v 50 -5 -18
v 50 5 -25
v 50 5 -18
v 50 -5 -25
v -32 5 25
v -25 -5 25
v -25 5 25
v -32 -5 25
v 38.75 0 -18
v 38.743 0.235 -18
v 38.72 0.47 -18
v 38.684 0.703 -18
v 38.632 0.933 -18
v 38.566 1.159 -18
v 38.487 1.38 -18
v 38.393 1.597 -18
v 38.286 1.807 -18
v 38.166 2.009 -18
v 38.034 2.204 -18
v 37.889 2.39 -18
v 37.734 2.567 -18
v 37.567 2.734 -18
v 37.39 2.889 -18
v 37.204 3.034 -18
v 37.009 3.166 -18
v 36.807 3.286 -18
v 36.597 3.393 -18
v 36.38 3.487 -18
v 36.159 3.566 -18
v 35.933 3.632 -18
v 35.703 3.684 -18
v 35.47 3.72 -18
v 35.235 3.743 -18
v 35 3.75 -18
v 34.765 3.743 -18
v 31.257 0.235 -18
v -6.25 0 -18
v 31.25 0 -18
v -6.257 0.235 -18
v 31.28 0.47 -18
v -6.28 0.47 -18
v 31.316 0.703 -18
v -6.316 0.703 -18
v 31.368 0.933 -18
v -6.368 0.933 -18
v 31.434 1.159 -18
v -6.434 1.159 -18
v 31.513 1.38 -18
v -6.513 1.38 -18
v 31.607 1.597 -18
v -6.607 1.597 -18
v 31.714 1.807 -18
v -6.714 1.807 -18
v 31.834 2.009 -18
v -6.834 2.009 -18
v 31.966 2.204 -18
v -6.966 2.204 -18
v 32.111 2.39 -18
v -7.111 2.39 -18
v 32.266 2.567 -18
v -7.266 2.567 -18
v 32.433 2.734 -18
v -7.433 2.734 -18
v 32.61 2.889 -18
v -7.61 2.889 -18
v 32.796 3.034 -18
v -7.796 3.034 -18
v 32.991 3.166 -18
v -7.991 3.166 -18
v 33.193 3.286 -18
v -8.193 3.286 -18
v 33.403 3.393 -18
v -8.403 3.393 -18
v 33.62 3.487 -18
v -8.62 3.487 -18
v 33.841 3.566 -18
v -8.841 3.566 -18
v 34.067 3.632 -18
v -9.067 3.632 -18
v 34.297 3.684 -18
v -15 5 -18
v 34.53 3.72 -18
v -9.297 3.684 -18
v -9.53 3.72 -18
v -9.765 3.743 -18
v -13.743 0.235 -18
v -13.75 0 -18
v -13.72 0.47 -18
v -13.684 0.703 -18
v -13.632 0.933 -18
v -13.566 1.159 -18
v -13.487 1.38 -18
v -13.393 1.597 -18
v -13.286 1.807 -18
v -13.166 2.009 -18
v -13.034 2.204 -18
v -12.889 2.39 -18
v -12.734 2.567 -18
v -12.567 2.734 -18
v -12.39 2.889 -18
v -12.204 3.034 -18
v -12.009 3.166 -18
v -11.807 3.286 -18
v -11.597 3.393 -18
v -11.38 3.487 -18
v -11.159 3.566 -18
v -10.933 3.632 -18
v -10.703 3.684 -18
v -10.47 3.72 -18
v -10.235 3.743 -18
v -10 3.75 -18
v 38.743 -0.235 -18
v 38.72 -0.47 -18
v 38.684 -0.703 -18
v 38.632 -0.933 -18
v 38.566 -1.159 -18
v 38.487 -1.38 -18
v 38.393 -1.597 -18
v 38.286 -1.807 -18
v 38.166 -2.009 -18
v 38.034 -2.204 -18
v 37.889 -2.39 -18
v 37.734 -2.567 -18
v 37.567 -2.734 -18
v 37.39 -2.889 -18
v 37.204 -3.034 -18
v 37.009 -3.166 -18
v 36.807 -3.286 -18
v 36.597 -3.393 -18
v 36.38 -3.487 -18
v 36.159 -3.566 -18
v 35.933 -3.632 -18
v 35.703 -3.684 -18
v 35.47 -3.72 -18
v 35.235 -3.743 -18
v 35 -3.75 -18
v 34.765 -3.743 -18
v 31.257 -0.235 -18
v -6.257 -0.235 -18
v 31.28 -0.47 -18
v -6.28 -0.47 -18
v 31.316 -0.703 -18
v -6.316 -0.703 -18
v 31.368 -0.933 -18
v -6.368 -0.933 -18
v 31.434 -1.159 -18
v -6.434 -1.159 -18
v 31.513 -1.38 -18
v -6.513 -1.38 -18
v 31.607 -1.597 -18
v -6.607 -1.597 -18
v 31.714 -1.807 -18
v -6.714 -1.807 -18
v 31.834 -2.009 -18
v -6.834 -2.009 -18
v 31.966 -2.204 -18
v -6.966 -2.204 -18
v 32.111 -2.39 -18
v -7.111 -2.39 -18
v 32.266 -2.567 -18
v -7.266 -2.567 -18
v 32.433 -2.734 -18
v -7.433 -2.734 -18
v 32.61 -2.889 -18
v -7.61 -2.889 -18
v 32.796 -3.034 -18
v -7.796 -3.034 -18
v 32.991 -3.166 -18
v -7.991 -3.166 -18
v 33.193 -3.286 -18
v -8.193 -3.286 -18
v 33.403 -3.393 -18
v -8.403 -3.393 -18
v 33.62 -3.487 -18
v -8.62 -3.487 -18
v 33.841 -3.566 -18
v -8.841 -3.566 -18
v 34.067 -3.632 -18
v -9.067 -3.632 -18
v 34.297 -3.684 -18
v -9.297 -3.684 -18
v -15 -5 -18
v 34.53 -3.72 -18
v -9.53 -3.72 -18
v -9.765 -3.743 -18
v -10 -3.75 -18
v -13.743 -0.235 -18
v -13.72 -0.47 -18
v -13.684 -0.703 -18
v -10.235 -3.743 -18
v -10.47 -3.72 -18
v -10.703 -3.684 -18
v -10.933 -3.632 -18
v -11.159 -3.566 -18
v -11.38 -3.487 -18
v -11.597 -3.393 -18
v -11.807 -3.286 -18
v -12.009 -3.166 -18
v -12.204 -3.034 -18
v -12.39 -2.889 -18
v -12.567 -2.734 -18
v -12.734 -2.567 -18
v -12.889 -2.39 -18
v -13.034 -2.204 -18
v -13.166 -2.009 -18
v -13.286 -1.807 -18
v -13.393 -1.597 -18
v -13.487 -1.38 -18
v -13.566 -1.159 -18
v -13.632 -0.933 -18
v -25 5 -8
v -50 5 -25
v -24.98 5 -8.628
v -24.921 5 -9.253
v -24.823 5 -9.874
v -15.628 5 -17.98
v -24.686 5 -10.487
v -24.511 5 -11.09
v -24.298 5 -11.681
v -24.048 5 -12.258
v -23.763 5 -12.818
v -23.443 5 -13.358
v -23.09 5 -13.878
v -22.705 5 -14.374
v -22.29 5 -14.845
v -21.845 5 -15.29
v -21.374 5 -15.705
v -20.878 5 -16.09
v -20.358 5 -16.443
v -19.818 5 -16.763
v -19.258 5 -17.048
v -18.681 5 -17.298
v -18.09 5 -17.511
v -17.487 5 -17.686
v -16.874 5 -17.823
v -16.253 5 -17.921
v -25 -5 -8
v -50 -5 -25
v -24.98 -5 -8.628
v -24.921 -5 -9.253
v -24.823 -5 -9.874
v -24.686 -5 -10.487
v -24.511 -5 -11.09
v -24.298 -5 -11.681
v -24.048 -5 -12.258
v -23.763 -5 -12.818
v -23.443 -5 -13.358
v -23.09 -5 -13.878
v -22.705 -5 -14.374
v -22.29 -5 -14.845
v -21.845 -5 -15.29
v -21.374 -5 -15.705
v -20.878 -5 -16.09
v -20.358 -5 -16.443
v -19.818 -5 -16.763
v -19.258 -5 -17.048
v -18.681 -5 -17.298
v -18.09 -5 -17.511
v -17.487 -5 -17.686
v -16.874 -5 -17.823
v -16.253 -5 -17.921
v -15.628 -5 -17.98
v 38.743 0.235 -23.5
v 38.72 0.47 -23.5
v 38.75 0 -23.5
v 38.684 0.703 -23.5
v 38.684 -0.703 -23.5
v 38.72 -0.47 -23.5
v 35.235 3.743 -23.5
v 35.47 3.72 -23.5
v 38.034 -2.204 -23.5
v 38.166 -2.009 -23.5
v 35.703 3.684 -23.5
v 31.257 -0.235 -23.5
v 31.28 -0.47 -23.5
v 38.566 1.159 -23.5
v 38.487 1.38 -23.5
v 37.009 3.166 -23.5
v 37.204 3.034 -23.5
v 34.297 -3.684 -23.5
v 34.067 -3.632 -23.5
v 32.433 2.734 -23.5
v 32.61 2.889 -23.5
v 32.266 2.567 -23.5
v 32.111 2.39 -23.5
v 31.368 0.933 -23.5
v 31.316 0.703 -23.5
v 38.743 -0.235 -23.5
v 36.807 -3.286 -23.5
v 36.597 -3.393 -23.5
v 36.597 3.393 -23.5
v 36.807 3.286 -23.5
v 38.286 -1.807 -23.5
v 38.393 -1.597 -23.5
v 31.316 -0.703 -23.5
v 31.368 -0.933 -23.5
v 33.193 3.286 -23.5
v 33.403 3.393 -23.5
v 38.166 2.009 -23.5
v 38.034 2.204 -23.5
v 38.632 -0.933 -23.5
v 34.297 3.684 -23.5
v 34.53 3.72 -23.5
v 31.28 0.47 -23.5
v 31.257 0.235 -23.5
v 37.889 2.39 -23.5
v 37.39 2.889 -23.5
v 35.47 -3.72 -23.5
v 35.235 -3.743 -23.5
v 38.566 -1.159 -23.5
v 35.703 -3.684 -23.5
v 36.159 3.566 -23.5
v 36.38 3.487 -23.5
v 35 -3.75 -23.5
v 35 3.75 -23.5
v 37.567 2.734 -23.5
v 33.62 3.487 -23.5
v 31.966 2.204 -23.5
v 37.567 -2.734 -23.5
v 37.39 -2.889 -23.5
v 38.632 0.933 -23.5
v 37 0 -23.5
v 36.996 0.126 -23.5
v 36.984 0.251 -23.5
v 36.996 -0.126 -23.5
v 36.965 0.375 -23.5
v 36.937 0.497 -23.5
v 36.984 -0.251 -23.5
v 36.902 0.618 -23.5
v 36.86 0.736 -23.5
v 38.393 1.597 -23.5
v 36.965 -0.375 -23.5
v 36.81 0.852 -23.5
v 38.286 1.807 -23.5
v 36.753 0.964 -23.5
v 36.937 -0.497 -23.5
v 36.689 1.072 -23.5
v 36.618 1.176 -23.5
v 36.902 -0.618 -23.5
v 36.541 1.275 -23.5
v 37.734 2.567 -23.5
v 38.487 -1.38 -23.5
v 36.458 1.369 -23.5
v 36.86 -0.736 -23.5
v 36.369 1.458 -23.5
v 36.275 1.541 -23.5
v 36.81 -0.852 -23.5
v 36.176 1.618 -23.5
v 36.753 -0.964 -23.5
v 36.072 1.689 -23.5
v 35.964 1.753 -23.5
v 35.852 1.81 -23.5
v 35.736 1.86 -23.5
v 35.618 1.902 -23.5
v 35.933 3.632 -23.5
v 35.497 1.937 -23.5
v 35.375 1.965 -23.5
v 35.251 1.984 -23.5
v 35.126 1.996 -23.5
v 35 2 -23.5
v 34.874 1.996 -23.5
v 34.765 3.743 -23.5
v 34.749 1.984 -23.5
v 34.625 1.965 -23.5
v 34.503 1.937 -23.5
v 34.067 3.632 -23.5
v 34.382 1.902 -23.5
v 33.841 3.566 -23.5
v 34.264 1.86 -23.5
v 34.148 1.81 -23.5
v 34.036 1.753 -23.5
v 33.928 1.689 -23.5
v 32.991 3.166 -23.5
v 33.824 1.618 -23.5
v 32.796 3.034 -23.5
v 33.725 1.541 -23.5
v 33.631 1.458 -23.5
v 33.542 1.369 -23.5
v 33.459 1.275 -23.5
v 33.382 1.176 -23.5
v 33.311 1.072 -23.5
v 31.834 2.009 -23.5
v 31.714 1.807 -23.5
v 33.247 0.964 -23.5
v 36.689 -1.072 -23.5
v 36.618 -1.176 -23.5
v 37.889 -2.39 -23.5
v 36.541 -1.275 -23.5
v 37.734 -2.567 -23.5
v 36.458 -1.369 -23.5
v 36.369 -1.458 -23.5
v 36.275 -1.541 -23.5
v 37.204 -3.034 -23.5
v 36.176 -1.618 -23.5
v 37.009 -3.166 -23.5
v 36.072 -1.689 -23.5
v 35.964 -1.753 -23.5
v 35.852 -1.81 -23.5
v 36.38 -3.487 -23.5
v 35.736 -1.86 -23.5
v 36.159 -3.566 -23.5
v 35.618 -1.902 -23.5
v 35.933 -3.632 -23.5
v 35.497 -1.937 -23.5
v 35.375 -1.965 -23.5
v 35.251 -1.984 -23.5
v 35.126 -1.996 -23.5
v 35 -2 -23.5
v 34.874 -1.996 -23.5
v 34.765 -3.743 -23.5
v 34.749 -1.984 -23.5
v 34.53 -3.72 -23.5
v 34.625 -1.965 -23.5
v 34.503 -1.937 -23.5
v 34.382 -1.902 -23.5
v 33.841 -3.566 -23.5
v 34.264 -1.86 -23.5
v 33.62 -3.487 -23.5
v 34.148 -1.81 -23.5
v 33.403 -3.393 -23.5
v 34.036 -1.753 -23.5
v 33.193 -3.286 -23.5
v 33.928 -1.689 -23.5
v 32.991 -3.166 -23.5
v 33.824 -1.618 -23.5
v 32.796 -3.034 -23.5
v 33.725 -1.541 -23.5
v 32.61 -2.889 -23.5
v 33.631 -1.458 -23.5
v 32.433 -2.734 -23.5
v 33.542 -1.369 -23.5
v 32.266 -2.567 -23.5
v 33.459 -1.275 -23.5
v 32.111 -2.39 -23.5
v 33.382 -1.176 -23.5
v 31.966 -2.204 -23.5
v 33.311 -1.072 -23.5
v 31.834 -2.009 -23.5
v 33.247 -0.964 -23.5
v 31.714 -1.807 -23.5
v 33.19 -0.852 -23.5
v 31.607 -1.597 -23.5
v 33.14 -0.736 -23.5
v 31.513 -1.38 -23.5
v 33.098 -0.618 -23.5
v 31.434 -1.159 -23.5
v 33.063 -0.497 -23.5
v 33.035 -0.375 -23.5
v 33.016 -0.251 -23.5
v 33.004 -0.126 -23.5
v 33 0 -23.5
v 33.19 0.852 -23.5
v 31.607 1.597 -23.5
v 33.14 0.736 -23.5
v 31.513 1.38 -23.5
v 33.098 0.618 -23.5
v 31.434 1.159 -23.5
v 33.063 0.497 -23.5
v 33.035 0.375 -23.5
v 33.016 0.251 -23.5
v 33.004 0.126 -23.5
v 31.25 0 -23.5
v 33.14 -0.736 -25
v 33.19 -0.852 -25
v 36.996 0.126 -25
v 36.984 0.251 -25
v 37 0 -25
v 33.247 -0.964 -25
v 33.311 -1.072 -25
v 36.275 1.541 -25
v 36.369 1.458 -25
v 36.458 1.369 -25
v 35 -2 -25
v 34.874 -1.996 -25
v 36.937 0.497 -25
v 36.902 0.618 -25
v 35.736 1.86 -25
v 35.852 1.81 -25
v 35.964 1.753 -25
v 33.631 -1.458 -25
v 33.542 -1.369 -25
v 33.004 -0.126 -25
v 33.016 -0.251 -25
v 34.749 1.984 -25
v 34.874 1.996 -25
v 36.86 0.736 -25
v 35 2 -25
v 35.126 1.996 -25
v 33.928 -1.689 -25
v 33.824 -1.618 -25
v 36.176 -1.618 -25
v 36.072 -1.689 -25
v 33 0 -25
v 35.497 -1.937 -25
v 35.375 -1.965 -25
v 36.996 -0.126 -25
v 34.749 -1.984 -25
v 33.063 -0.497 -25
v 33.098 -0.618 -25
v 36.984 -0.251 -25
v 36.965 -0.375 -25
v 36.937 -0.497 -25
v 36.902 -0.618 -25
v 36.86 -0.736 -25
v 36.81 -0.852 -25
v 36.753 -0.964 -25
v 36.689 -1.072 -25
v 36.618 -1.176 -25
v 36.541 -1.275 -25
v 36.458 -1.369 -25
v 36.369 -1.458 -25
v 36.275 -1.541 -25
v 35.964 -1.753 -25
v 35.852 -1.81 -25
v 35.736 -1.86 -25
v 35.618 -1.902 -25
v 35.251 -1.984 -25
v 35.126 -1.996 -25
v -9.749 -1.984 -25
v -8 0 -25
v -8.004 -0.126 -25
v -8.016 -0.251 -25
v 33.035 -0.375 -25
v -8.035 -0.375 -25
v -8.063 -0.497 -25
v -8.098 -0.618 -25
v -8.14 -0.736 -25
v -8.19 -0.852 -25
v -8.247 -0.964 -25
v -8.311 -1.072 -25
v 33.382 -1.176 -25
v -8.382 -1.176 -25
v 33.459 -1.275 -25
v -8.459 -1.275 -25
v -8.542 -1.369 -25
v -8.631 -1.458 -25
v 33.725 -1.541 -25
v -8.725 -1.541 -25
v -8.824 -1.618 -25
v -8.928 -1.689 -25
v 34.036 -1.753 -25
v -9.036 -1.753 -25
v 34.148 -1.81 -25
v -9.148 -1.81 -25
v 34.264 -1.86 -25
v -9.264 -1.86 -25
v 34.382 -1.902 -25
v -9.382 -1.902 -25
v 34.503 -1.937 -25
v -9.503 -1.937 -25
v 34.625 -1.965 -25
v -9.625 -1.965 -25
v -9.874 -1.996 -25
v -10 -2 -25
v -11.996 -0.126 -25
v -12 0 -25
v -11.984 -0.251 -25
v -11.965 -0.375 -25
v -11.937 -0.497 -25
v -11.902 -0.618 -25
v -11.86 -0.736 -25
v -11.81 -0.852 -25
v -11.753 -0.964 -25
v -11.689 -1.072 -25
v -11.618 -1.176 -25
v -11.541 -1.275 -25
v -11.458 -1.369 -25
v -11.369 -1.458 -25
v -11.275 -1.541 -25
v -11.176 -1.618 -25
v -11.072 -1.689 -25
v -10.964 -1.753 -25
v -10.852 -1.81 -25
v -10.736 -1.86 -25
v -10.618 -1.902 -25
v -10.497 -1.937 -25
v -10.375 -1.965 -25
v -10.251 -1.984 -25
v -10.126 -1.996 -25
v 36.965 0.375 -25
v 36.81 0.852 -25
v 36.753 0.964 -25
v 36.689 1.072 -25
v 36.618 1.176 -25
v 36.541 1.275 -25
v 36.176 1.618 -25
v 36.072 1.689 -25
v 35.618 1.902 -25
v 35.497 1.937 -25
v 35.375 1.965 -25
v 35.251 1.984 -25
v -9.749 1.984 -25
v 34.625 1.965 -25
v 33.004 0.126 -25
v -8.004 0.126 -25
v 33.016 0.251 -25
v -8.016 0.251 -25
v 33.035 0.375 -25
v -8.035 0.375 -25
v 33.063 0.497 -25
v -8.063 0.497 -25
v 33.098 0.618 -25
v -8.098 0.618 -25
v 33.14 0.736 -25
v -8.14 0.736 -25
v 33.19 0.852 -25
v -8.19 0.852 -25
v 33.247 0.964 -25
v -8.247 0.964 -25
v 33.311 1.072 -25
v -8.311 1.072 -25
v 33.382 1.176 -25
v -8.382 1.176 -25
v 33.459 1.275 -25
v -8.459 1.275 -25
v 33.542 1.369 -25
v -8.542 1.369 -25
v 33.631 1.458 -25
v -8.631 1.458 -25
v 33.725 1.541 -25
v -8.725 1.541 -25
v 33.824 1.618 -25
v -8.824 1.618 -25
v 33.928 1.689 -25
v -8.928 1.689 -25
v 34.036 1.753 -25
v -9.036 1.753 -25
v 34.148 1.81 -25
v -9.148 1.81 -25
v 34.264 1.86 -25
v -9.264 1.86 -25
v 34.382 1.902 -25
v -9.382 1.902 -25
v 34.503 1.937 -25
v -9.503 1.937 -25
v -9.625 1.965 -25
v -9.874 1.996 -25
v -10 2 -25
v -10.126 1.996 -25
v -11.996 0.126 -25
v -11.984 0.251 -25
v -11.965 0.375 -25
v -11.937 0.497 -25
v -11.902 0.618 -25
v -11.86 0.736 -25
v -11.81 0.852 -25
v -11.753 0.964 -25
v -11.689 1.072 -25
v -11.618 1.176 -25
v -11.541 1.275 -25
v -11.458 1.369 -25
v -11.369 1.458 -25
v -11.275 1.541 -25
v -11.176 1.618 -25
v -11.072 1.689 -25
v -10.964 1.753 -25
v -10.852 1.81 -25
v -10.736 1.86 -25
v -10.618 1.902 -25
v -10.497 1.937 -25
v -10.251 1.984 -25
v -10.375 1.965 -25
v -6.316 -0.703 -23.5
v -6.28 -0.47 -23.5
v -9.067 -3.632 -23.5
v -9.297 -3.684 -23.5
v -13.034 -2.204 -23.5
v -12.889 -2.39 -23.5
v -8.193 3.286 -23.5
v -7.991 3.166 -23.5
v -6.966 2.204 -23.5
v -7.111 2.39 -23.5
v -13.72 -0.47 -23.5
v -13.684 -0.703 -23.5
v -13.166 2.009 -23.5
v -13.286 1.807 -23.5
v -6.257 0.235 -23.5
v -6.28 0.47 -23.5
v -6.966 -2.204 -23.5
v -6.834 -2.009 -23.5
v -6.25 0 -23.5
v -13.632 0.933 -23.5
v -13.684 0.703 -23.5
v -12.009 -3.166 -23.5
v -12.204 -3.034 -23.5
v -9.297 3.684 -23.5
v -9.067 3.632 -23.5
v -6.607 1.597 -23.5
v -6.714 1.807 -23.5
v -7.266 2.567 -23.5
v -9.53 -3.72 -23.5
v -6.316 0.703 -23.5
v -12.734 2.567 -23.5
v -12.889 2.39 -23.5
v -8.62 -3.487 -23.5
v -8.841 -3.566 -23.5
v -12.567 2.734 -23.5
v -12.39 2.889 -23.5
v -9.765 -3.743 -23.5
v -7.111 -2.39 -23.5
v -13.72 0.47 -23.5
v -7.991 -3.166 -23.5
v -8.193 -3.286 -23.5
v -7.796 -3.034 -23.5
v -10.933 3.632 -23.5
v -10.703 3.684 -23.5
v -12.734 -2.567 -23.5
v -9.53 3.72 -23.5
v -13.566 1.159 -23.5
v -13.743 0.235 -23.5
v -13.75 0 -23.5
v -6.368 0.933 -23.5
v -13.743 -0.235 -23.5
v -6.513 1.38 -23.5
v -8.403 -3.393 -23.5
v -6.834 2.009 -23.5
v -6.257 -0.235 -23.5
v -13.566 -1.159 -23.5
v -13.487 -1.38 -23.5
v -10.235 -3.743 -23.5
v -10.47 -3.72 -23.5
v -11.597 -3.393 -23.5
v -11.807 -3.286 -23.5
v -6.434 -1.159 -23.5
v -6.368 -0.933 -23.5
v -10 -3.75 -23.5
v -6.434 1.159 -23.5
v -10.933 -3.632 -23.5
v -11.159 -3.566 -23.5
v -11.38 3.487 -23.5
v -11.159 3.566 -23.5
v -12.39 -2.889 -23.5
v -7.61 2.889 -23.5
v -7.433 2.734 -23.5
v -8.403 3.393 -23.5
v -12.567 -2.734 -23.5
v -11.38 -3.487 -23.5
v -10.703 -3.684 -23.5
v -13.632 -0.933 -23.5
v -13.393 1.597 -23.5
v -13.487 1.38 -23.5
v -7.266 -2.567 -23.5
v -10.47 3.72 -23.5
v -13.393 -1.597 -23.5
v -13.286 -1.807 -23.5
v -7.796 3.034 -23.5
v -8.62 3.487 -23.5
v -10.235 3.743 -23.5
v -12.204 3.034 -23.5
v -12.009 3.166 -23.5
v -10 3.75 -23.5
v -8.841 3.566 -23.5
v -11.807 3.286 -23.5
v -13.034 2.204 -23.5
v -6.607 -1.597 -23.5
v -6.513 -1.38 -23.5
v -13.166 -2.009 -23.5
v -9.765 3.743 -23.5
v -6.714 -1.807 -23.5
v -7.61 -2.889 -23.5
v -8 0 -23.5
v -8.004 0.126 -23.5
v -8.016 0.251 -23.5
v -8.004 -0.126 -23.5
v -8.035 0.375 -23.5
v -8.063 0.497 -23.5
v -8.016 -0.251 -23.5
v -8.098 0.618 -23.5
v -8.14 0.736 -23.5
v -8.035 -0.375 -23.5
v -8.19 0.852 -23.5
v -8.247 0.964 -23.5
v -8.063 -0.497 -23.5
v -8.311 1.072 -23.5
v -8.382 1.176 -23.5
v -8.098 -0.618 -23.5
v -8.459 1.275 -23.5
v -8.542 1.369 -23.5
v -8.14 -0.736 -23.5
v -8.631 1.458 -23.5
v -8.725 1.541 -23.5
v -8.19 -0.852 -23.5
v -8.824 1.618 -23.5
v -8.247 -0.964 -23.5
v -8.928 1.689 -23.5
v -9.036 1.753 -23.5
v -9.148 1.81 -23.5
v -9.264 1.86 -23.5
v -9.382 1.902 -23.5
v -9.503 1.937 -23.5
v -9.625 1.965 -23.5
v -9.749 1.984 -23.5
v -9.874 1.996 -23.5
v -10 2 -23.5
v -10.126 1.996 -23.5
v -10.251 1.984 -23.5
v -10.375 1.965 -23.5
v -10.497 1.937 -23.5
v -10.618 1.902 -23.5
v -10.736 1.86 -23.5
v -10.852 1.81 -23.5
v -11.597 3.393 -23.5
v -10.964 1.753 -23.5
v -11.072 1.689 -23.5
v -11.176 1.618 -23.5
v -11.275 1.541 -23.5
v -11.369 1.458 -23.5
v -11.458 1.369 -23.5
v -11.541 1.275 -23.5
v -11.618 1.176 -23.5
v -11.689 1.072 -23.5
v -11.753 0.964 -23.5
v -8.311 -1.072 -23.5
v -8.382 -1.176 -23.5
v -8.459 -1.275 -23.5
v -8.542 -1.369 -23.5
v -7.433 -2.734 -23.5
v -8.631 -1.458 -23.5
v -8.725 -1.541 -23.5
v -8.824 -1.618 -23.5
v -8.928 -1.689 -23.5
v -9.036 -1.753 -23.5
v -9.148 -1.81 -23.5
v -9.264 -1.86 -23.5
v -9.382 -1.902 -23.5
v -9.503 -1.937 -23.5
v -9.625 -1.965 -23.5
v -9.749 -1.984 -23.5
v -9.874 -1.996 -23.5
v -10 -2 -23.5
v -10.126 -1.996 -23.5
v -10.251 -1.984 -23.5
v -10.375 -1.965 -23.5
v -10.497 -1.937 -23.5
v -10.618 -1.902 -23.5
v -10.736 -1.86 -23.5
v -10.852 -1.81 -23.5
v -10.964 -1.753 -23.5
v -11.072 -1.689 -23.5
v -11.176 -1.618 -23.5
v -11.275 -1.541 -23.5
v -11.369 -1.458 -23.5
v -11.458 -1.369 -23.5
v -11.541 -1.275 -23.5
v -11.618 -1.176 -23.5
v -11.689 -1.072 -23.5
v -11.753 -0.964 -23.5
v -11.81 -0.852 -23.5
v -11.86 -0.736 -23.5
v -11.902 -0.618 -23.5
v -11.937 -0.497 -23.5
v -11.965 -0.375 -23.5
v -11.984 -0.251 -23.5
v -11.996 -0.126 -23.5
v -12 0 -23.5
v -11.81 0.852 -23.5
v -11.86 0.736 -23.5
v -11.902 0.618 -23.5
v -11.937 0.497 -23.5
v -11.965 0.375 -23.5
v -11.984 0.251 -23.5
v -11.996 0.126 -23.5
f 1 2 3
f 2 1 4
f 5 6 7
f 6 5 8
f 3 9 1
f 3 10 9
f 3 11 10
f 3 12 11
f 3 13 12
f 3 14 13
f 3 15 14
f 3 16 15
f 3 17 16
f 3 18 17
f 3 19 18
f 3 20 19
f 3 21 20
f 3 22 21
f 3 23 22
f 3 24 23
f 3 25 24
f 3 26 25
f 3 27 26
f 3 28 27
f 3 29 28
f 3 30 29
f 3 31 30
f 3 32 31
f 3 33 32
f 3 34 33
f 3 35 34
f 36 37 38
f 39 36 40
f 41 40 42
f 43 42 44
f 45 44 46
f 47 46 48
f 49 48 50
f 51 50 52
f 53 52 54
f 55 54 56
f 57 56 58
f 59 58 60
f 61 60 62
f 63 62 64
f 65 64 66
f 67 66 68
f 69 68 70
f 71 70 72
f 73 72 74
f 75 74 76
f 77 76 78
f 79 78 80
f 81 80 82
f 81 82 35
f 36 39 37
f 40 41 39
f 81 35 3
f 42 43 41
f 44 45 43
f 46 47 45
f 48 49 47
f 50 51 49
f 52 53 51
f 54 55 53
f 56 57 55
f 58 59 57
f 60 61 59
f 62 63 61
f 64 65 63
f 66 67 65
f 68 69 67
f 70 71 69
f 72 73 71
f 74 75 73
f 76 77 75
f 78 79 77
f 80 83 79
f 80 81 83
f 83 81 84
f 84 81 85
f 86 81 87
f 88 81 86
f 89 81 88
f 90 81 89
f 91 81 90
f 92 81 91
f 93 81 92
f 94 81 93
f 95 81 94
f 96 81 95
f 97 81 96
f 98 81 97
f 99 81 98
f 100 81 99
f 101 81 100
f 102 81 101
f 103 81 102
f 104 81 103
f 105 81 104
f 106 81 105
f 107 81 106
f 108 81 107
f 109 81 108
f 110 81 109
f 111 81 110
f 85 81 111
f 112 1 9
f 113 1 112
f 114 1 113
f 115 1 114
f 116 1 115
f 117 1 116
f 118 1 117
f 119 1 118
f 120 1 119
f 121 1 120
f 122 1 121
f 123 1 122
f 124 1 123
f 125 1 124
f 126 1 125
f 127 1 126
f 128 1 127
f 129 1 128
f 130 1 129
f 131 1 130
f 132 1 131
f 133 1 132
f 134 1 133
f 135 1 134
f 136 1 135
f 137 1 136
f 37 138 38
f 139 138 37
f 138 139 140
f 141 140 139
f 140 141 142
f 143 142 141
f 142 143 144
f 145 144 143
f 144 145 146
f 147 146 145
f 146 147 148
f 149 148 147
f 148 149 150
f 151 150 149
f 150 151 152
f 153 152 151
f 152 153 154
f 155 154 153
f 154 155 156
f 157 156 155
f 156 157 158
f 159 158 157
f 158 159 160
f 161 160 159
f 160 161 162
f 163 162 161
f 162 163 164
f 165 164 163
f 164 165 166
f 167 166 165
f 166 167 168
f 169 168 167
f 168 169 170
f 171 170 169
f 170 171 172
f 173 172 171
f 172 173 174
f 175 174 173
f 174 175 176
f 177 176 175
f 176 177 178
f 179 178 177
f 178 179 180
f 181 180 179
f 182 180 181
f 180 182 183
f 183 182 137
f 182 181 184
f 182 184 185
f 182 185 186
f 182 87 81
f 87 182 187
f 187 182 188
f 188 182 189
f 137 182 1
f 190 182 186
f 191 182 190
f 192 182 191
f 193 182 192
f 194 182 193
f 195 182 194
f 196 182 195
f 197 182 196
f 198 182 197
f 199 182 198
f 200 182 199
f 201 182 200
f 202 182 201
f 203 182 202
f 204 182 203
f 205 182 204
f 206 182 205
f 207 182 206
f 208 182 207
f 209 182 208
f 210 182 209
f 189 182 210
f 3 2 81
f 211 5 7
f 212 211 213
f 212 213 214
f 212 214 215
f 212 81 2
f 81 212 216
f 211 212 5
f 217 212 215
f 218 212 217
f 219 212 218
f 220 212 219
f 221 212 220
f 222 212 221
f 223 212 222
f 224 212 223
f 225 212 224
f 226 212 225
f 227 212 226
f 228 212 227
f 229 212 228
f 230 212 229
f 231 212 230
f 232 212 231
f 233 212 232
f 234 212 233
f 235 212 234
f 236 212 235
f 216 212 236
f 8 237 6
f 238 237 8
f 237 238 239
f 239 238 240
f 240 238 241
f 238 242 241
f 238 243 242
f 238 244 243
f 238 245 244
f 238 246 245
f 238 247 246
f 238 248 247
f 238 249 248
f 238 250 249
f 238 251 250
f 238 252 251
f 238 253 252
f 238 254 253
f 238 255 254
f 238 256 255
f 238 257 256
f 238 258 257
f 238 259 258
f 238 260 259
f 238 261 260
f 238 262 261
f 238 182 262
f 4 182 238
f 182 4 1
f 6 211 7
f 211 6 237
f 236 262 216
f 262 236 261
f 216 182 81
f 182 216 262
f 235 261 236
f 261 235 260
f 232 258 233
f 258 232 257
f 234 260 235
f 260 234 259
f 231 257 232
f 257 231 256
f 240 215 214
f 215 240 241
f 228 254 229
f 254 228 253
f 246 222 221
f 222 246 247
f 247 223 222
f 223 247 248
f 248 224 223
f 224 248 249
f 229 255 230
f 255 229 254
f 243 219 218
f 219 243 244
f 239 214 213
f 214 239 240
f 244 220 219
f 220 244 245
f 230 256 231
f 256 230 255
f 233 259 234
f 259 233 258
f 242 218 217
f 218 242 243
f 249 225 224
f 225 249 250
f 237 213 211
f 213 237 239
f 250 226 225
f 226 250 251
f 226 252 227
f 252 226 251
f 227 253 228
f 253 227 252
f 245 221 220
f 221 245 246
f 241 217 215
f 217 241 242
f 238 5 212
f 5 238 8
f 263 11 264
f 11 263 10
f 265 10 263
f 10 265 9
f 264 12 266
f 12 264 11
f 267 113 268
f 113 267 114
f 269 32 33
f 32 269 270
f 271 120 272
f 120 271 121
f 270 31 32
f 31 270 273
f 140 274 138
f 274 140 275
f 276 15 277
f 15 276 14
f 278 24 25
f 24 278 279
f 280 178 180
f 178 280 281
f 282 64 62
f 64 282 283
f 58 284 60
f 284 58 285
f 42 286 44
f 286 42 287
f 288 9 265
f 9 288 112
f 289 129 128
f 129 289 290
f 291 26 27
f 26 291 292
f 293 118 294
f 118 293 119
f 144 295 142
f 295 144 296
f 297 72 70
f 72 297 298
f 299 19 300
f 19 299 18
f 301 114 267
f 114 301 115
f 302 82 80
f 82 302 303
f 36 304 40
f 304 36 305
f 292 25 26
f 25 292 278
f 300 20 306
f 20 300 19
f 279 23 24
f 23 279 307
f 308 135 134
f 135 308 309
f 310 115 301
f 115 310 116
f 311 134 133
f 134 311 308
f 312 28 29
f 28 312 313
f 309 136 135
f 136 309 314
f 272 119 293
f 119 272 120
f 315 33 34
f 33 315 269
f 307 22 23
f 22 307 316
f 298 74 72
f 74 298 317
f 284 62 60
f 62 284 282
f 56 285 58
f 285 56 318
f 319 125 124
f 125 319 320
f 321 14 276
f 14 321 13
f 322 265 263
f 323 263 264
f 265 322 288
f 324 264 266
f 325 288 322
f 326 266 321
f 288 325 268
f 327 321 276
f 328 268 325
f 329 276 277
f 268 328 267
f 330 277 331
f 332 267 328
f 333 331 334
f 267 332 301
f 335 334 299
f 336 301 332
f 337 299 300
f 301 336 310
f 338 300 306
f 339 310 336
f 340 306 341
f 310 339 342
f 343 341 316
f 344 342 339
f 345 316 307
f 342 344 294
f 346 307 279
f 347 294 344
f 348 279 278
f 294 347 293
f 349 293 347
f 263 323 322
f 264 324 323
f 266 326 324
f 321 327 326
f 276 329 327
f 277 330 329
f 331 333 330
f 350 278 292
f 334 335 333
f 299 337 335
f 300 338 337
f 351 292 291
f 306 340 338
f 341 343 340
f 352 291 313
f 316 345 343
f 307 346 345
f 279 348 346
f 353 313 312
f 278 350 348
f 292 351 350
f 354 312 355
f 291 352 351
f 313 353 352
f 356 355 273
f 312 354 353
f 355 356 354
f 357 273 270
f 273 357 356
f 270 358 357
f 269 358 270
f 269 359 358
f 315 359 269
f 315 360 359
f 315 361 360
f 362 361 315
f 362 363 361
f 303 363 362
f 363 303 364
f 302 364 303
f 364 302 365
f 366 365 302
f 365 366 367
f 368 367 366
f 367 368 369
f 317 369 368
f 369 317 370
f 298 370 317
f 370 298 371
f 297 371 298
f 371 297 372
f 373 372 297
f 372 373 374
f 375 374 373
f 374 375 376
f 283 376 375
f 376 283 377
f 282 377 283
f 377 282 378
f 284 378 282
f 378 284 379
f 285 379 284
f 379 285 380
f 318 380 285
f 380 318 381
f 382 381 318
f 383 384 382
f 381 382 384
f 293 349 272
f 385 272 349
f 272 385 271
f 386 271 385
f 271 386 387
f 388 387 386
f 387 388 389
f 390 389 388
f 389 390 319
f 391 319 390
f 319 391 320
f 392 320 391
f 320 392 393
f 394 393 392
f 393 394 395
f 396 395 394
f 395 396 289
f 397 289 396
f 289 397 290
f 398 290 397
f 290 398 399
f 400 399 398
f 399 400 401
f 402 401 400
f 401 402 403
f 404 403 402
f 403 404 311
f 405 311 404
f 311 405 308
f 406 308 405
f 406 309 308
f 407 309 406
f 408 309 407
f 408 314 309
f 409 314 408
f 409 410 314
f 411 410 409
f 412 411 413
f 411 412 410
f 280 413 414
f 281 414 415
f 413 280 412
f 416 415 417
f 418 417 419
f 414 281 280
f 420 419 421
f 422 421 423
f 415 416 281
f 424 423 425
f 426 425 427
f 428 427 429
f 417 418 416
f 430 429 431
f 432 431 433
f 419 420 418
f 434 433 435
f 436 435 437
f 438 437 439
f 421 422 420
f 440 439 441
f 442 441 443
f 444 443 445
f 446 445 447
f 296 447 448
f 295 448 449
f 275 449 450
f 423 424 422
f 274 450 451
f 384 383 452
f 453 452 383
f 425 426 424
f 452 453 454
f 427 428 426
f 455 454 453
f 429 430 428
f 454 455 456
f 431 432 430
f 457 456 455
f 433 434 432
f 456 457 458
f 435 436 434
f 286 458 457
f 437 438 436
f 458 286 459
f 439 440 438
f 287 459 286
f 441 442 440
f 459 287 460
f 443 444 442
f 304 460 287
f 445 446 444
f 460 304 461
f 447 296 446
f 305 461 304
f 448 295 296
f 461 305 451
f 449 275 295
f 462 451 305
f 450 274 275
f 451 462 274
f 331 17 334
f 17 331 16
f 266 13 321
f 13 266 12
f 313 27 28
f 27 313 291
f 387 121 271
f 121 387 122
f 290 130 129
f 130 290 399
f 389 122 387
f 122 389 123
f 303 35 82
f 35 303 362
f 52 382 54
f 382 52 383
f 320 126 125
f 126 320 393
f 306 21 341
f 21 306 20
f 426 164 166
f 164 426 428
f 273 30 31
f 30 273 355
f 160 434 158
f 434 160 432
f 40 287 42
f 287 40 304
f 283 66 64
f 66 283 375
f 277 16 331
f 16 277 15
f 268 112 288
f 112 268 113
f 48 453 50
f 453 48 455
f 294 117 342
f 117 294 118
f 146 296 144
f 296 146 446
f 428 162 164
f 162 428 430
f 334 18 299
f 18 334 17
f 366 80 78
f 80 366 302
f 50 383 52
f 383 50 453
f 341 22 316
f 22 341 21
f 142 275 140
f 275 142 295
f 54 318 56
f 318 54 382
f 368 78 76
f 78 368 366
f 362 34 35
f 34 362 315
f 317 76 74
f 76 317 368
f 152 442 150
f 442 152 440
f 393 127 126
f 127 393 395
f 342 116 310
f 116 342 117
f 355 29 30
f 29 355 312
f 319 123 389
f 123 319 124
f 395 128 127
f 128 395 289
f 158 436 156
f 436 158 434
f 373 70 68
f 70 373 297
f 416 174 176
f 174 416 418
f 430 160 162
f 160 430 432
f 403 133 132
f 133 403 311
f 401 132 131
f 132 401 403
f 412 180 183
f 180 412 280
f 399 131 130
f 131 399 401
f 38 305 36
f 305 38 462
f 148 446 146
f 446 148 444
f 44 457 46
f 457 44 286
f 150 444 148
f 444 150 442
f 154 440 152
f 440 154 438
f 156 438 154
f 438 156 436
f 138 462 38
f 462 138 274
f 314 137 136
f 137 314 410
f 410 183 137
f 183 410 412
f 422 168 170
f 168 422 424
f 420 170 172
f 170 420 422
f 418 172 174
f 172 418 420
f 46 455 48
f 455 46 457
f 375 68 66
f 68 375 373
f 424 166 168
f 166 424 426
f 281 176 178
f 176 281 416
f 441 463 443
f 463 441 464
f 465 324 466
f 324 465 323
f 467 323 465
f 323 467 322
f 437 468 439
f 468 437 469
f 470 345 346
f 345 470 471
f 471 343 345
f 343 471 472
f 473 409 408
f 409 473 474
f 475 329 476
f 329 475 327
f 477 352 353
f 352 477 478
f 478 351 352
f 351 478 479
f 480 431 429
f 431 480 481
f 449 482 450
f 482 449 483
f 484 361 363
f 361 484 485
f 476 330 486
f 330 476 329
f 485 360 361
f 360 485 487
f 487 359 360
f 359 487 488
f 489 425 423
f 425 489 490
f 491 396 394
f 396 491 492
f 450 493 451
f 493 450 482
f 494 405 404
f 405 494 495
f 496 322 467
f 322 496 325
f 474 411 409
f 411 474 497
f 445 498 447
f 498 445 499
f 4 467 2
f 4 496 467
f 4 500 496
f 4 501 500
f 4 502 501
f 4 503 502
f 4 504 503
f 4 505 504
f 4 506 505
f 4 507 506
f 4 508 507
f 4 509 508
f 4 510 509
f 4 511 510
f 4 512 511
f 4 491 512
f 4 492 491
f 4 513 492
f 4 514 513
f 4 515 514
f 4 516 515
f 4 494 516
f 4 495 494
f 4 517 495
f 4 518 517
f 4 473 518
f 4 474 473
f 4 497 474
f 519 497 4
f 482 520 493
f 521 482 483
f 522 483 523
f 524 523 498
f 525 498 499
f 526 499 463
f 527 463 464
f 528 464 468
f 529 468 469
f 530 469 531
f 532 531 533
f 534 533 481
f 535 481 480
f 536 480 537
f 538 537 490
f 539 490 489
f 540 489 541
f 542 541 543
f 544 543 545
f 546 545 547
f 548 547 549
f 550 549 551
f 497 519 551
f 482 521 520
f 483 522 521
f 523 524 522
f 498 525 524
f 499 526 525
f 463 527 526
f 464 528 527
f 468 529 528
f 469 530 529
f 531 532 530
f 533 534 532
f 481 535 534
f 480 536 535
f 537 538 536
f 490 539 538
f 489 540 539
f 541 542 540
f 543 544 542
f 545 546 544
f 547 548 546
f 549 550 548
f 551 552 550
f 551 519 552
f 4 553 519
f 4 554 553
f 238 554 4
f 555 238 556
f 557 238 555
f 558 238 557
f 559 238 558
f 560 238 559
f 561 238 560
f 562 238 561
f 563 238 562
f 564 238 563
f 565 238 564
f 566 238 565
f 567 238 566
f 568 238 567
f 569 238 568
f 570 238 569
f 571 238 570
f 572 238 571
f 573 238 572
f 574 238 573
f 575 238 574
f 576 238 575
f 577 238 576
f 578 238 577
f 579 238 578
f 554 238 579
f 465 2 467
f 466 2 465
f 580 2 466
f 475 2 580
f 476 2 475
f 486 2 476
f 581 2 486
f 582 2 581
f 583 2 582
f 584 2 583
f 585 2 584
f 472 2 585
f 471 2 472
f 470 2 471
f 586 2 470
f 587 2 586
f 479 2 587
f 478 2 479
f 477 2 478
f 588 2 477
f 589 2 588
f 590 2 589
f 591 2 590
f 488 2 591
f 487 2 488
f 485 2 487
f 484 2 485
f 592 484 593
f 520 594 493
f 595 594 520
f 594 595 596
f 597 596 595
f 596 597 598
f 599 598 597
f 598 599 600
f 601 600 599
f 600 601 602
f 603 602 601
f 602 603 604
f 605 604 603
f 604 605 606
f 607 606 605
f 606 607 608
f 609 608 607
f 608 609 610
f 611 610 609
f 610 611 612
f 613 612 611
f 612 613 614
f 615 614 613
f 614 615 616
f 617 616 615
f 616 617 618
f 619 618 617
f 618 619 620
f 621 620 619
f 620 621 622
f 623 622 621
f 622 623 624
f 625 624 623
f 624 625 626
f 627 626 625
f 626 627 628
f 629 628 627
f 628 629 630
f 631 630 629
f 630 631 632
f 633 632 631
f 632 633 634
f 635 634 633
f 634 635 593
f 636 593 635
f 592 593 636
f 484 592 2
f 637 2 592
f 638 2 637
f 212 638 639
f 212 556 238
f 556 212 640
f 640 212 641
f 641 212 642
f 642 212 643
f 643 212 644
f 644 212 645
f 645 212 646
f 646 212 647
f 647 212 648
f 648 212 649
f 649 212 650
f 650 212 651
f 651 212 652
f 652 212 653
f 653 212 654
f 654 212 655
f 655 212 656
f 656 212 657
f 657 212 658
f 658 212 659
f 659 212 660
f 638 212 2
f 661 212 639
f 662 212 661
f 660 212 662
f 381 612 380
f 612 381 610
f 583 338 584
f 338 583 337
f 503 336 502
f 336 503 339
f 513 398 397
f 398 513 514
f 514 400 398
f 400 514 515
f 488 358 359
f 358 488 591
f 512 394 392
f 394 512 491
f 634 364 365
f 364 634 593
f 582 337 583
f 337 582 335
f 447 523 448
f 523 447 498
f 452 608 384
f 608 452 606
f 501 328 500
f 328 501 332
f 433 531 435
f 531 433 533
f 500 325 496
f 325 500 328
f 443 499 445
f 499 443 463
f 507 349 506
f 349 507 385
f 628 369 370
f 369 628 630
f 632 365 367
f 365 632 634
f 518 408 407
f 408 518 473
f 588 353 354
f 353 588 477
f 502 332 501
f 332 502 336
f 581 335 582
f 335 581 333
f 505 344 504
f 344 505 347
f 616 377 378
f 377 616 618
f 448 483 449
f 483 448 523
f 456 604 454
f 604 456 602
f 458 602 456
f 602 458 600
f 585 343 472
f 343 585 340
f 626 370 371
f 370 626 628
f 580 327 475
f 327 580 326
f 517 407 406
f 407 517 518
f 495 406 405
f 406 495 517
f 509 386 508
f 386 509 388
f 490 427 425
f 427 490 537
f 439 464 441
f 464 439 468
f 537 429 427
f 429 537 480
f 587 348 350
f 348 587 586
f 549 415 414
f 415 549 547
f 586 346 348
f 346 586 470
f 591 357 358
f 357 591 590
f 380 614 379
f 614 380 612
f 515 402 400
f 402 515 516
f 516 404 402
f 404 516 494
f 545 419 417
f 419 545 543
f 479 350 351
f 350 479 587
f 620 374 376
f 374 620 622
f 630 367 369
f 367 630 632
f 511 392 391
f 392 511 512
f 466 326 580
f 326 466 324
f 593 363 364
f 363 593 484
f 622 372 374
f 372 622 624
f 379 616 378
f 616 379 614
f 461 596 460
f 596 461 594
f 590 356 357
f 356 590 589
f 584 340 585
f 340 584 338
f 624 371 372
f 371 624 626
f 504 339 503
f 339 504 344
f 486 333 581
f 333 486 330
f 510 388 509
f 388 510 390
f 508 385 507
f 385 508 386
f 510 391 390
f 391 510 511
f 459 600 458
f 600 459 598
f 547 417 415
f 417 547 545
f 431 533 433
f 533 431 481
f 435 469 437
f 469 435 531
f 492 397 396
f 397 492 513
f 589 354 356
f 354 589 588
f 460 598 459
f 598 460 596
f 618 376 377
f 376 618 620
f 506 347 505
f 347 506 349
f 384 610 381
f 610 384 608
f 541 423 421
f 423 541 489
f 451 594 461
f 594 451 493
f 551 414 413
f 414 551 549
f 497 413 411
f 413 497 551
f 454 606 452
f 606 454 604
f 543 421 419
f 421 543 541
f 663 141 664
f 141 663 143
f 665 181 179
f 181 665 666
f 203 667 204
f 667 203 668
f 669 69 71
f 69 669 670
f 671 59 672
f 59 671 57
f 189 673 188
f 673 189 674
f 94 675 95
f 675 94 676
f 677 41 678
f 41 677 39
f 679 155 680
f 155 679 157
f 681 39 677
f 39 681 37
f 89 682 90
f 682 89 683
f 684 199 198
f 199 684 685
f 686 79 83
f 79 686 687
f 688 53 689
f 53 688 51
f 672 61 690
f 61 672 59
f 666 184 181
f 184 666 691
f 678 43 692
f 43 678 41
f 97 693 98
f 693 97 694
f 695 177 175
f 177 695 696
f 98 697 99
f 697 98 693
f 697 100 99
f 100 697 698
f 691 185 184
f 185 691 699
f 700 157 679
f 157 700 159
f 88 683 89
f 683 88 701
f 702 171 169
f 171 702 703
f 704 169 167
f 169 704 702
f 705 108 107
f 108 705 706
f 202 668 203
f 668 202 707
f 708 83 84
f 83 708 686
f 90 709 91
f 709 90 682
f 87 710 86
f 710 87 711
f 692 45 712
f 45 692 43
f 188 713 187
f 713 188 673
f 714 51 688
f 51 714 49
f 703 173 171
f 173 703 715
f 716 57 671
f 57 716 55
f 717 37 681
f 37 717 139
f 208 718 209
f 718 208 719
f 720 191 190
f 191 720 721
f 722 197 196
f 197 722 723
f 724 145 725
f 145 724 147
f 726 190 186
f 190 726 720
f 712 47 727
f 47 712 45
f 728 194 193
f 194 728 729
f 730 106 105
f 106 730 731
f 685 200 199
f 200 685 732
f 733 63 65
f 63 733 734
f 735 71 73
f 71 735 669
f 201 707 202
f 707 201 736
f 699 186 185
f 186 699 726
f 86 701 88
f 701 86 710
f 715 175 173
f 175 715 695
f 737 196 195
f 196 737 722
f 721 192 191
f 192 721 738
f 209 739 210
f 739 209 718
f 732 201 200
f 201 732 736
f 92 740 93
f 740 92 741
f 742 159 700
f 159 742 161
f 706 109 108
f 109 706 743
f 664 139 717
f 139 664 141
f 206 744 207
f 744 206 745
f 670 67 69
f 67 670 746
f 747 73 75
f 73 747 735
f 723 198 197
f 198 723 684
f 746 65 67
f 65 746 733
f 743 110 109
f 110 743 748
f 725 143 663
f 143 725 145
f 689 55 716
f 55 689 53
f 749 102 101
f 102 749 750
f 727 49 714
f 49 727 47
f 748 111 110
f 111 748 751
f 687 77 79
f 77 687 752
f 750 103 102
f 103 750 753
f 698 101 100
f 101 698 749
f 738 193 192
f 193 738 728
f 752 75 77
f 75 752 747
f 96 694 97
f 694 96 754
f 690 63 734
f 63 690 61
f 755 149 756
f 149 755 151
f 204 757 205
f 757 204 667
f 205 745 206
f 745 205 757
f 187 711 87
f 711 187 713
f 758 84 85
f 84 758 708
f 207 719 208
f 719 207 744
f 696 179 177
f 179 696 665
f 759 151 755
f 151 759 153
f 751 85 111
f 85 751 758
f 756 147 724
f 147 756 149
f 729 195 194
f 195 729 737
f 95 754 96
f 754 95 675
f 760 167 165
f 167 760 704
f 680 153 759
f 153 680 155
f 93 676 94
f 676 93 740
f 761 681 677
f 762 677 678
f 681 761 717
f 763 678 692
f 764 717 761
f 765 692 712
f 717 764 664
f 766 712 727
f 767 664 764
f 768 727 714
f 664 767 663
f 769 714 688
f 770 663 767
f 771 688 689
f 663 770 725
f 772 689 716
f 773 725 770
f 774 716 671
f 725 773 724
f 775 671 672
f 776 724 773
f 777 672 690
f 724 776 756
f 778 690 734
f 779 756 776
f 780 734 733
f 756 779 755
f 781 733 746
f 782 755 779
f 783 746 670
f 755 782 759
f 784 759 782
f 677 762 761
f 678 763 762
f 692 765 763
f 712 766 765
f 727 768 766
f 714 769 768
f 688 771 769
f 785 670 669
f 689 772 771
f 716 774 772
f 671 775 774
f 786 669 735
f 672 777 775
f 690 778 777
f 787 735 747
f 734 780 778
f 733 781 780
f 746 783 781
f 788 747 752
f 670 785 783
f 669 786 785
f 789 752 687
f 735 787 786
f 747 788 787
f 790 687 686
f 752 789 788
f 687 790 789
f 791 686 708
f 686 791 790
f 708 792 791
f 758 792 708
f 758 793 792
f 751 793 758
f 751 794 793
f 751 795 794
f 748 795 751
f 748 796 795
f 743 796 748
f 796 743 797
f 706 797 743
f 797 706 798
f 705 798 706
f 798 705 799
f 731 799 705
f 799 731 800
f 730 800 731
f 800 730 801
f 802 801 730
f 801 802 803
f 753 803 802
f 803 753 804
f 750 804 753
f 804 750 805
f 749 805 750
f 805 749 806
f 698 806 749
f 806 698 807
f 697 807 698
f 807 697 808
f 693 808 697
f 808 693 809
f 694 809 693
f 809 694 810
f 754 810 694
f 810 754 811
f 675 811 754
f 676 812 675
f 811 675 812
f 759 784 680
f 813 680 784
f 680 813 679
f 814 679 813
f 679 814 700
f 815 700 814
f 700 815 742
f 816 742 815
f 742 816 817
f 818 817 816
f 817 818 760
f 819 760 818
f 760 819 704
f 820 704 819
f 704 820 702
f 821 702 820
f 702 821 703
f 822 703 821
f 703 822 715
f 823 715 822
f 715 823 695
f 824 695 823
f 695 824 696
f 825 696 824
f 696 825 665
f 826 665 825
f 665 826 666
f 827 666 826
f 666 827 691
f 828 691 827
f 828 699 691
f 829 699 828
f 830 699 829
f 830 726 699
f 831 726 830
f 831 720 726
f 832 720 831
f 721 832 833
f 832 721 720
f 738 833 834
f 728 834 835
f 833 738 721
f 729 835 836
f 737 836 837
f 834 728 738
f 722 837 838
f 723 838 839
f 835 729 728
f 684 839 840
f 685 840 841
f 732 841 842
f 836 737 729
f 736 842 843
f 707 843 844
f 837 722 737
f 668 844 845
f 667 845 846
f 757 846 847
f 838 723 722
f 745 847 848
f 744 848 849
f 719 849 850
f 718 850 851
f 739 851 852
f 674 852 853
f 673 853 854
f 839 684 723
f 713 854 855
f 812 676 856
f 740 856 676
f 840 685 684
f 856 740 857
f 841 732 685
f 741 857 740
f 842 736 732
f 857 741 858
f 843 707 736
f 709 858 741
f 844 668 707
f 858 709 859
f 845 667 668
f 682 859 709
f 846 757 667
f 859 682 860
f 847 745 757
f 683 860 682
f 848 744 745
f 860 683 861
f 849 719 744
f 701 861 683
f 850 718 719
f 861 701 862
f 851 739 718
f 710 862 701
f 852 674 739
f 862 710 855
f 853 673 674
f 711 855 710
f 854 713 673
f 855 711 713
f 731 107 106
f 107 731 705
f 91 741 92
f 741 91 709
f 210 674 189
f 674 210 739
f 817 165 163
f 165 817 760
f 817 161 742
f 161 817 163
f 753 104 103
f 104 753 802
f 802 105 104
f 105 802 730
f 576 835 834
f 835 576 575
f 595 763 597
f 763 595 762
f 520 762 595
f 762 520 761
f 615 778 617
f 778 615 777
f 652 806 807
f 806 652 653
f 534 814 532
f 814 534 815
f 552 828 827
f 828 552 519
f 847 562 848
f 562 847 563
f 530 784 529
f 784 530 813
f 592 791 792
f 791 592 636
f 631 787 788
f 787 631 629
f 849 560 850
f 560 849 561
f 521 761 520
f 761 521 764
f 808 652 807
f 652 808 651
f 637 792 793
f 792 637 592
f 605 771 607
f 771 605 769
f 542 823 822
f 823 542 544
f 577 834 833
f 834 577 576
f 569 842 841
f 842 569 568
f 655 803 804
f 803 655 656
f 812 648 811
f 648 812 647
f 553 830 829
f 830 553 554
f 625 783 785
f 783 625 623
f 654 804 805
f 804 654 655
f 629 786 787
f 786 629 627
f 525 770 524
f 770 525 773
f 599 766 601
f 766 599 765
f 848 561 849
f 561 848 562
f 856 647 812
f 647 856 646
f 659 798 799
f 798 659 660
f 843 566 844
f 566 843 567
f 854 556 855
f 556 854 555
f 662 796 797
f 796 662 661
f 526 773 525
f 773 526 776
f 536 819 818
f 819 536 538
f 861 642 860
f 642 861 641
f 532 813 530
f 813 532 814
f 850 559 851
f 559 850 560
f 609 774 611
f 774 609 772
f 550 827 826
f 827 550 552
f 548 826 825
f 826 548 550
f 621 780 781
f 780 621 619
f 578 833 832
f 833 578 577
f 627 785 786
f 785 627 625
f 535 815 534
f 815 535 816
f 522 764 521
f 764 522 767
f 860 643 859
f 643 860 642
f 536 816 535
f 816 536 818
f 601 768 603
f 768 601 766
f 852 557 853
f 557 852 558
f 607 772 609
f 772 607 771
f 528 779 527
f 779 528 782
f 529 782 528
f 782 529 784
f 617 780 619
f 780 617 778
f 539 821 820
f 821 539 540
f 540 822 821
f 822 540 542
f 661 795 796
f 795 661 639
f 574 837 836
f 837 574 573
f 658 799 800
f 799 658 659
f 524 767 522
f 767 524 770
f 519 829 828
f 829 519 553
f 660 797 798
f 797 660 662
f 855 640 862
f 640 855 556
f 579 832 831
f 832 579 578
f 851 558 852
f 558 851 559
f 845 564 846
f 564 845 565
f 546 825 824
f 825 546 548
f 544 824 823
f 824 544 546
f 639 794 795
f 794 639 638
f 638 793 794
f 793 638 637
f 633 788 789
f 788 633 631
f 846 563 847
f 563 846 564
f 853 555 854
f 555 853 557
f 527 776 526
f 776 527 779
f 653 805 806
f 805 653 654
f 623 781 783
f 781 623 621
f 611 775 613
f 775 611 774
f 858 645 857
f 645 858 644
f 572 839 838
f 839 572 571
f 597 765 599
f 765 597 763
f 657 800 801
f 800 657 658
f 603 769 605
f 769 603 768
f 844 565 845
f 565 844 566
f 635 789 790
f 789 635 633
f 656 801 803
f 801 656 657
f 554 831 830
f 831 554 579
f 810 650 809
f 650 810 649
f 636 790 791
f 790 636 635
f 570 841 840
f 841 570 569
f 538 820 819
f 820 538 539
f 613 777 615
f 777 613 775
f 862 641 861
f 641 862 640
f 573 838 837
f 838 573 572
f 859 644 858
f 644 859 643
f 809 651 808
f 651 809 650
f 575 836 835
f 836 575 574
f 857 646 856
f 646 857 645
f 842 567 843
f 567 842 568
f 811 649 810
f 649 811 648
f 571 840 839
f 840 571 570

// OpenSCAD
/*
    Title: Stand.scad
    Description: Desk stand to hold the hard drive.
    Author: Matias Micheletto
    Date: 12-Jul-2019
    Email: matias.micheletto@uns.edu.ar
    Website: https://matiasmicheletto.github.io
*/

$fn = 100;

// Dimensions
L = 100; // Foot lenth
H = 50; // Height
W = 10; // Width
R = 10; // Radius of curved angle

// Screw holes
sep = 45; // Separation
db = 15; // Distance to the border of the foot


module envelope(){
    cube([L,W,H], center = true);
}

L2 = L*0.75; H2 = H-7; // Lenght and height to remove for the center hole
w = L-L2-H+H2; s = sqrt(H*H+w*w); // Dimensions of the diagonal rectangle

module rem(){
    union(){ // Interior cropping
        translate([(L-L2+R)/2,0,(H-H2)/2])
            cube([(L2-R),W,H2], center = true);
        
        translate([(L-L2)/2,0,(H-H2+R)/2])
            cube([L2,W,H2-R], center = true);
        
        translate([L/2-L2+R,0,H/2-H2+R])
        rotate([0,90,90])
            cylinder(r = R, h = W+1, center = true);
    }
    
    // Diagonal cropping
    translate([-L/2,-W/2,-H/2])
    rotate([0,-asin(H/s),0])
        cube([s,W,w*H/s]);
}

Rh1 = 3.75; // Radius for the screw's head
Rh2 = 2; // Radius for the screw's trhead
ph = 1.5; // Adjusting zone thickness
module holes(){
    
    translate([L/2-db,0,-H2/2+ph/2])
        cylinder(r = Rh1, h = H-H2-ph, center = true);
    translate([L/2-db,0,-H2/2])
        cylinder(r = Rh2, h = H-H2, center = true);
    
    translate([L/2-db-sep,0,-H2/2+ph/2])
        cylinder(r = Rh1, h = H-H2-ph, center = true);
    translate([L/2-db-sep,0,-H2/2])
        cylinder(r = Rh2, h = H-H2, center = true);
}

//rotate([0,180+asin(H/s),0]) // Vertical display (to visualize)
difference(){
    envelope();
    rem();
    holes();
}
